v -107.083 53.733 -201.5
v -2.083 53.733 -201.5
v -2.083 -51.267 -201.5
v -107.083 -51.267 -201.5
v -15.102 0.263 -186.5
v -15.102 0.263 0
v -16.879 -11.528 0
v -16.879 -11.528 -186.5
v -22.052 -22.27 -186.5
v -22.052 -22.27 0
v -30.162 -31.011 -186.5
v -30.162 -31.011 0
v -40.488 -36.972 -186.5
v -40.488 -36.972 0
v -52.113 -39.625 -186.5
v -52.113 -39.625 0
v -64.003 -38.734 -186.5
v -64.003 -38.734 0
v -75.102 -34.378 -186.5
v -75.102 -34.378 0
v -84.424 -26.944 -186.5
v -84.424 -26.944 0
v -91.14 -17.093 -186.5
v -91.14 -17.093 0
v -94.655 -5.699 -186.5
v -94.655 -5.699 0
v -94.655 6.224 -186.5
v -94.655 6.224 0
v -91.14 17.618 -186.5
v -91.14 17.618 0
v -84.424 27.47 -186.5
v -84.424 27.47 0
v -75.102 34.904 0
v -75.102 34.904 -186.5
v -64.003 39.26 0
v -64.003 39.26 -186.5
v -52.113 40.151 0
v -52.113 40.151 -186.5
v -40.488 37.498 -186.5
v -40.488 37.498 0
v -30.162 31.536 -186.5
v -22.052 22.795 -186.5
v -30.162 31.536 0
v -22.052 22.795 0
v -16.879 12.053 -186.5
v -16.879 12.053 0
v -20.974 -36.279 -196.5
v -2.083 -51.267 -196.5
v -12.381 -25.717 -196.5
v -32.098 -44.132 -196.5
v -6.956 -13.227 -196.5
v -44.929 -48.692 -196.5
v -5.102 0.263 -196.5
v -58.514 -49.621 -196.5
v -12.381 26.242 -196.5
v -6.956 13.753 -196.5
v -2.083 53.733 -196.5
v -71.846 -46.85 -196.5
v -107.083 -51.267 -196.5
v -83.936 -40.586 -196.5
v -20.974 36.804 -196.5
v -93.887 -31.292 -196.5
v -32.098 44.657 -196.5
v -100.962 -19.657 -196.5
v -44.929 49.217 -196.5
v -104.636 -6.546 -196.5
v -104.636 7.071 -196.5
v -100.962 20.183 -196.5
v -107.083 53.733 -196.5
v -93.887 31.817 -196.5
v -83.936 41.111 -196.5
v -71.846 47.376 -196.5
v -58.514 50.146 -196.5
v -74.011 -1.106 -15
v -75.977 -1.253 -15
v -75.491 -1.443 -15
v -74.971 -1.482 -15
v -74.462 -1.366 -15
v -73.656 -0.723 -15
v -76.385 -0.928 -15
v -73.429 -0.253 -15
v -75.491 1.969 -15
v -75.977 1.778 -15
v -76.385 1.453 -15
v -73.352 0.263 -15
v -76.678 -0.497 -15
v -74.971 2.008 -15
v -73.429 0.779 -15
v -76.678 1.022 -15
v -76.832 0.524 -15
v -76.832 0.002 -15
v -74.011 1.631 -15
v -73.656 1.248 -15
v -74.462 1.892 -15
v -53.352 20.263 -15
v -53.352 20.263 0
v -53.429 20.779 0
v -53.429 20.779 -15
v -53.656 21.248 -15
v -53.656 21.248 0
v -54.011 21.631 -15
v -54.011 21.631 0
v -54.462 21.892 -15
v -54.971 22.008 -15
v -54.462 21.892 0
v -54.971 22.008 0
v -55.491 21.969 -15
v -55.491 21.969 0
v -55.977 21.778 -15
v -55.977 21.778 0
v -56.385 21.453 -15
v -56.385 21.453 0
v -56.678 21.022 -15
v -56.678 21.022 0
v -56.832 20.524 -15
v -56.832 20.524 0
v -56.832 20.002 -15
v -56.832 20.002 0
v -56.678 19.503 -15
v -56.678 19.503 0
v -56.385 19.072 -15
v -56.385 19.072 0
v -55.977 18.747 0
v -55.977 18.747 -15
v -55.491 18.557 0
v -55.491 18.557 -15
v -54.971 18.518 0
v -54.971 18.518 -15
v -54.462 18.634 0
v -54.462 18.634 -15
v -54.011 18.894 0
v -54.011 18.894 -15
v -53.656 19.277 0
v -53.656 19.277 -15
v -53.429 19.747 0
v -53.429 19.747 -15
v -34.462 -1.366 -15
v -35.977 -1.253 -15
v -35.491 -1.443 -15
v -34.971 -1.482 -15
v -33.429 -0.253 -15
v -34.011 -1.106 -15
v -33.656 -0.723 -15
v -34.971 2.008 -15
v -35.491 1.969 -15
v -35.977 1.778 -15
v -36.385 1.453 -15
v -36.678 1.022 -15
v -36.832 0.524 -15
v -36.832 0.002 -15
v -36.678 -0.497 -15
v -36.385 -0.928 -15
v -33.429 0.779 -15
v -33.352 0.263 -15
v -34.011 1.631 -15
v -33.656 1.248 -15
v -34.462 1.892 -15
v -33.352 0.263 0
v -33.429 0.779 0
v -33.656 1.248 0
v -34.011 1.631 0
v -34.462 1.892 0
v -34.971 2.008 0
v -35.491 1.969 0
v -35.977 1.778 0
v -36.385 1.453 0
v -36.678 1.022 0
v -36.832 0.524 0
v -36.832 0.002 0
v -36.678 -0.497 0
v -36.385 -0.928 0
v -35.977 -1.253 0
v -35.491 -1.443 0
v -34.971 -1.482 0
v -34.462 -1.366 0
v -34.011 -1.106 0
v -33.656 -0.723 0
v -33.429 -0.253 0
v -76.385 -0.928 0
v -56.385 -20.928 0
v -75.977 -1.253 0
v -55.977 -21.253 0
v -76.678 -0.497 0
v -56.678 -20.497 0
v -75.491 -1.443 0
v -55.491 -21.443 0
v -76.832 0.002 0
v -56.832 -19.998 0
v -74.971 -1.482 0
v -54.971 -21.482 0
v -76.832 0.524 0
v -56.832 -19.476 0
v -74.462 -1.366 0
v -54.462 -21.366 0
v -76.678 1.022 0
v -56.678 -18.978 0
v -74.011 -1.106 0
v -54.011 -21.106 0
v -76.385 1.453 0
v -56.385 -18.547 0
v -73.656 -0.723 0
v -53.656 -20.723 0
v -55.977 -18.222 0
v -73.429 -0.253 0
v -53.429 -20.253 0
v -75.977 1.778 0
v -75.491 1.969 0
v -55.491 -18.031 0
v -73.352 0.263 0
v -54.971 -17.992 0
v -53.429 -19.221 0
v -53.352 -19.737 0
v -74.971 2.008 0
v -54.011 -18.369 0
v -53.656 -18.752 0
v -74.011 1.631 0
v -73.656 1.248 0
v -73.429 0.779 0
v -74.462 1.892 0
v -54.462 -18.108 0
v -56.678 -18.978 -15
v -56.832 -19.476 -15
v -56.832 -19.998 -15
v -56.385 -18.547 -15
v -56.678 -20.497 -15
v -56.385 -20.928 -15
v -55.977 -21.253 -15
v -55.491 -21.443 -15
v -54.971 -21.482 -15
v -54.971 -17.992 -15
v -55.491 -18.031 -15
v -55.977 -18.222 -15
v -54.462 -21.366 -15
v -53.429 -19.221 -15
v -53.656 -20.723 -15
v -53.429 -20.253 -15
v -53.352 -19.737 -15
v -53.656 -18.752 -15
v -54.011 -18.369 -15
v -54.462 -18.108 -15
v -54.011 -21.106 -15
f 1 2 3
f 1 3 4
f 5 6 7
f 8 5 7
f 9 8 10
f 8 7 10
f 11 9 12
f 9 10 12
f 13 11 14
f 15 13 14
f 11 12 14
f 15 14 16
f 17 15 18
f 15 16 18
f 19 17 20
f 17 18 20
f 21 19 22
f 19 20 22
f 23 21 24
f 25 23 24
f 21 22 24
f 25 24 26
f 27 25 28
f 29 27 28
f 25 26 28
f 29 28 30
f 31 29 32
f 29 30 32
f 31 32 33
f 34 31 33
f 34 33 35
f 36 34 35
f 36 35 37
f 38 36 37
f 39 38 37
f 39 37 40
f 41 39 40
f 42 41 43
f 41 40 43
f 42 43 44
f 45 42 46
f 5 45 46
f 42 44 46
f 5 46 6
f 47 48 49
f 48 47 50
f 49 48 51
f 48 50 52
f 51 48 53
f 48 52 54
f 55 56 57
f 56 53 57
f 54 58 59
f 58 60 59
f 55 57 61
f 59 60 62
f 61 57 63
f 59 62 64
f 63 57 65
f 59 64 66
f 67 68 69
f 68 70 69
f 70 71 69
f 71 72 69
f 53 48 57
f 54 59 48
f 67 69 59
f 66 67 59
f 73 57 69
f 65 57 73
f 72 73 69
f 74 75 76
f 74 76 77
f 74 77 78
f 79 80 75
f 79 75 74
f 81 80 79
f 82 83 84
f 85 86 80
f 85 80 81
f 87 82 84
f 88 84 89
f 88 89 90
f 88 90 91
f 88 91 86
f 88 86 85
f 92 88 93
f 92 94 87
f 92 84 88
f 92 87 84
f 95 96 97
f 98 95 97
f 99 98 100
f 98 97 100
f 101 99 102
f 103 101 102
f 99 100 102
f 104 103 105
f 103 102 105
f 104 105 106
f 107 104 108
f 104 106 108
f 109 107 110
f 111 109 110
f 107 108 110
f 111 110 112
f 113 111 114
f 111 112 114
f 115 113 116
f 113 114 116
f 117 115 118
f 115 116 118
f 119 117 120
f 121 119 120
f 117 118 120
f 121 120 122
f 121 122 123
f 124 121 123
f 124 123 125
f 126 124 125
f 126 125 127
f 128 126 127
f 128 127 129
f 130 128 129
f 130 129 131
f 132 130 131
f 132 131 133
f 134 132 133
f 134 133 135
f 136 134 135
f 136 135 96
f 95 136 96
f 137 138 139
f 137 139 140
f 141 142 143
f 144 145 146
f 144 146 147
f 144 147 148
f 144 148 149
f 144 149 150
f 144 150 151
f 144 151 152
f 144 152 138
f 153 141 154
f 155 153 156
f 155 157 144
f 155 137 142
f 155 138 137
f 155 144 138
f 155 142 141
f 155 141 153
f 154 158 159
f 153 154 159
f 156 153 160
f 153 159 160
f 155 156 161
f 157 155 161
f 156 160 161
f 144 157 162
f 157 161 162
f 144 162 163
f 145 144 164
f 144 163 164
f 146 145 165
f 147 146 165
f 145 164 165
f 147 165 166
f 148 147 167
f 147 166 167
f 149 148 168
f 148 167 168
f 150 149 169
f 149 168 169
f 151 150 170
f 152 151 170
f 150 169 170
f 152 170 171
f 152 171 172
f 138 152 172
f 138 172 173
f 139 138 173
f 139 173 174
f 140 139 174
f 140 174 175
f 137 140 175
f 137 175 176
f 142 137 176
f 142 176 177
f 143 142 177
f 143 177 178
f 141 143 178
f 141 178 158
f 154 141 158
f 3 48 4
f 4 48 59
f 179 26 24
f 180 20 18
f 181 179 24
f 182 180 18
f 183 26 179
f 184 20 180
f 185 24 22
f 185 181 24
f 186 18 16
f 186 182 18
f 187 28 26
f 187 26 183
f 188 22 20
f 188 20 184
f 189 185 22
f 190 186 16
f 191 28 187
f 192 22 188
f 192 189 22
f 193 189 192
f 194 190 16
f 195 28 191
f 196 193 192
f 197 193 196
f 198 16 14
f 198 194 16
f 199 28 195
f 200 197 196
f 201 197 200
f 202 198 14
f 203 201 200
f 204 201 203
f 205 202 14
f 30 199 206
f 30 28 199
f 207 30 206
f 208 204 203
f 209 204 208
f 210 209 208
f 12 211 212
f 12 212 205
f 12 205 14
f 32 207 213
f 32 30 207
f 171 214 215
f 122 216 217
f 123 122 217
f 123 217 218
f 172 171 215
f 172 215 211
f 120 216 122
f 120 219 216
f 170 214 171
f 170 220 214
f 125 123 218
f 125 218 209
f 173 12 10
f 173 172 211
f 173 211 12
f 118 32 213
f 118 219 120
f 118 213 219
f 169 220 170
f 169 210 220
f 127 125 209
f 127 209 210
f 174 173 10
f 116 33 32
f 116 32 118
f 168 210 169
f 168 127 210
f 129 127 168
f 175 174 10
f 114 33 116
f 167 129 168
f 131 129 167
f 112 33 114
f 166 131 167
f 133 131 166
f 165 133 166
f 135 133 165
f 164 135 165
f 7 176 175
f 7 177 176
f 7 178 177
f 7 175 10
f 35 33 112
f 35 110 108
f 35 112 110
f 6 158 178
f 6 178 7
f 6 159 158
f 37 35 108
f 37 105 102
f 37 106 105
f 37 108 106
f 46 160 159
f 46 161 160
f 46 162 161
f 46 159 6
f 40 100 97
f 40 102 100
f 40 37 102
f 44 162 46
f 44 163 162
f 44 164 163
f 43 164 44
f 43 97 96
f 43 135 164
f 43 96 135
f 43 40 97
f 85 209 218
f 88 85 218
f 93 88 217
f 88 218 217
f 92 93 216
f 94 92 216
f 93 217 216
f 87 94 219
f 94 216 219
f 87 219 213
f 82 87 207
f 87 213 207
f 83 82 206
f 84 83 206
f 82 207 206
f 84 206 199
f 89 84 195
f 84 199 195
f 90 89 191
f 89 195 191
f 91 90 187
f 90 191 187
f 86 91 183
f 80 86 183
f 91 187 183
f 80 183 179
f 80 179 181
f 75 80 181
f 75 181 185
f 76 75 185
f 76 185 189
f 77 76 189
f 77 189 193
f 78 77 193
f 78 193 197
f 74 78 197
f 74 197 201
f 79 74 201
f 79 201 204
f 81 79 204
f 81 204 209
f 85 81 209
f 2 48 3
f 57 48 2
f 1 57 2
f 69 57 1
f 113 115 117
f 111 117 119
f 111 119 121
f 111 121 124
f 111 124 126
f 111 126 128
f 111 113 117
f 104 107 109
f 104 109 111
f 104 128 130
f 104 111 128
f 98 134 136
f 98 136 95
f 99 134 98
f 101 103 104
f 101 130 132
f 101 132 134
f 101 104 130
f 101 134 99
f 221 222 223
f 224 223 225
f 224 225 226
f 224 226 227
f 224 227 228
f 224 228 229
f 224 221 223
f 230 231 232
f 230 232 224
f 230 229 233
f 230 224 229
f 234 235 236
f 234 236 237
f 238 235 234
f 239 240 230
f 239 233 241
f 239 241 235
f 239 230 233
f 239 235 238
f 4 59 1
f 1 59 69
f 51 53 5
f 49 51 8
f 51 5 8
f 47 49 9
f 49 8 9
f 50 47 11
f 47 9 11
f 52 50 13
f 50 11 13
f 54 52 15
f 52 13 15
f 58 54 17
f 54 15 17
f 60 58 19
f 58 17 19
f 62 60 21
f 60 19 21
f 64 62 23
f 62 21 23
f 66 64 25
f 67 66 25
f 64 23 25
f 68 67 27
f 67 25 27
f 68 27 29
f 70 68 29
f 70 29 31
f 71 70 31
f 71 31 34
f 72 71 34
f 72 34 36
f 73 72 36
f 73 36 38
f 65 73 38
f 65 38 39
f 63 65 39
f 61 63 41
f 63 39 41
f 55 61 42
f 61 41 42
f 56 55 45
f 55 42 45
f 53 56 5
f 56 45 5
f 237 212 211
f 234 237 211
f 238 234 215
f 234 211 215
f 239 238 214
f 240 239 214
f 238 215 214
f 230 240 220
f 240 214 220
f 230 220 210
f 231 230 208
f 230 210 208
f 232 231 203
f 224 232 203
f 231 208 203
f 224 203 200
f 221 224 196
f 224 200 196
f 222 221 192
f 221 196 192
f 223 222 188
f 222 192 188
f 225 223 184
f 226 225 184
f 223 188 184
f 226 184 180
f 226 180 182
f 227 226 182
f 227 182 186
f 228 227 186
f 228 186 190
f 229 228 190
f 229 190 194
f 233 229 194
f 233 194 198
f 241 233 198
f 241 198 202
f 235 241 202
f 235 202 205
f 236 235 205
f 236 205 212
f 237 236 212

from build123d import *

# Parameters (mm, degrees)
CROQUIS1_W                  = 248.76
CROQUIS1_H                  = 195
SALIENTE_EXTRUIR1_DEPTH     = 5
CROQUIS2_W                  = 48
CROQUIS2_H                  = 30
CROQUIS2_W_2                = 30
CORTAR_EXTRUIR1_DEPTH       = 2
CROQUIS3_R                  = 2.375
CORTAR_EXTRUIR2_DEPTH       = 10
CROQUIS4_R                  = 40
SALIENTE_EXTRUIR2_DEPTH     = 196.5
CROQUIS5_R                  = 12.5
CORTAR_EXTRUIR3_DEPTH       = 10
CROQUIS12_W                 = 12
CROQUIS12_H                 = 30
SALIENTE_EXTRUIR3_DEPTH     = 4
REDONDEO1_R                 = 10
REDONDEO2_R                 = 10
REDONDEO3_R                 = 10
CORTAR_EXTRUIR5_DEPTH       = 255.266033949
CORTAR_EXTRUIR5_DEPTH_BACK  = 255.266033949
CROQUIS13_R                 = 1.625
CORTAR_EXTRUIR7_DEPTH       = 2
CROQUIS16_R                 = 1.75
CORTAR_EXTRUIR9_DEPTH       = 20
CORTAR_EXTRUIR17_DEPTH      = 307.465597013
CORTAR_EXTRUIR17_DEPTH_BACK = 307.465597013
CROQUIS21_W                 = 105
CROQUIS21_H                 = 105
SALIENTE_EXTRUIR4_DEPTH     = 5
CHAFL_N1_SIZE               = 10


with BuildPart() as part:
    # Croquis1 → Saliente-Extruir1 (new body)
    with BuildSketch(Plane.XY):
        with Locations((7.088293187, 0.26268)):
            Rectangle(CROQUIS1_W, CROQUIS1_H)
    extrude(amount=SALIENTE_EXTRUIR1_DEPTH)

    # Croquis2 → Cortar-Extruir1 (cut)
    with BuildSketch(Plane.XY.offset(5)):
        with Locations((-93.291706813, -82.23732)):
            Rectangle(CROQUIS2_W, CROQUIS2_H)
        with Locations((116.468293187, 82.76268)):
            Rectangle(CROQUIS2_W_2, CROQUIS2_H)
        with Locations((116.468293187, -82.23732)):
            Rectangle(CROQUIS2_W_2, CROQUIS2_H)
        with Locations((-93.291706813, 82.76268)):
            Rectangle(CROQUIS2_W, CROQUIS2_H)
    extrude(amount=-CORTAR_EXTRUIR1_DEPTH, mode=Mode.SUBTRACT)

    # Croquis3 → Cortar-Extruir2 (cut)
    with BuildSketch(Plane.XY.offset(5)):
        with Locations((-93.291706813, 83.76268)):
            Circle(CROQUIS3_R)
        with Locations((-93.291706813, -83.23732)):
            Circle(CROQUIS3_R)
        with Locations((116.468293187, 83.76268)):
            Circle(CROQUIS3_R)
        with Locations((116.468293187, -83.23732)):
            Circle(CROQUIS3_R)
    extrude(amount=-CORTAR_EXTRUIR2_DEPTH, mode=Mode.SUBTRACT)

    # Croquis4 → Saliente-Extruir2 (add)
    with BuildSketch(Plane(origin=(0, 0, 0), x_dir=(-1, 0, 0), z_dir=(0, 0, -1))):
        with Locations(Location((55.101706813, 0.26268, 0), (0, 0, 180))):
            Circle(CROQUIS4_R)
    extrude(amount=SALIENTE_EXTRUIR2_DEPTH)

    # Croquis5 → Cortar-Extruir3 (cut)
    with BuildSketch(Plane(origin=(0, 0, 0), x_dir=(-1, 0, 0), z_dir=(0, 0, -1))):
        with Locations((-76.968293187, 0.26268)):
            Circle(CROQUIS5_R)
    extrude(amount=-CORTAR_EXTRUIR3_DEPTH, mode=Mode.SUBTRACT)

    # Croquis12 → Saliente-Extruir3 (add, symmetric)
    with BuildSketch(Plane(origin=(7.088293187, 0, 0), x_dir=(0, 0, -1), z_dir=(1, 0, 0))):
        with Locations((6, 82.76268)):
            Rectangle(CROQUIS12_W, CROQUIS12_H)
        with Locations((6, -82.23732)):
            Rectangle(CROQUIS12_W, CROQUIS12_H)
    extrude(amount=SALIENTE_EXTRUIR3_DEPTH, both=True)

    # Redondeo1
    redondeo1_edges = [part.edges().sort_by_distance(p)[0] for p in [
        (7.088293187, 67.76268, 0),
        (7.088293187, -67.23732, 0),
    ]]
    fillet(redondeo1_edges, radius=REDONDEO1_R)

    # Redondeo2
    redondeo2_edges = [part.edges().sort_by_distance(p)[0] for p in [
        (7.088293187, 67.76268, -12),
        (7.088293187, -67.23732, -12),
    ]]
    fillet(redondeo2_edges, radius=REDONDEO2_R)

    # Redondeo3
    redondeo3_edges = [part.edges().sort_by_distance(p)[0] for p in [
        (7.088293187, 97.76268, -12),
        (7.088293187, -97.23732, -12),
    ]]
    fillet(redondeo3_edges, radius=REDONDEO3_R)

    # Croquis13 → Cortar-Extruir5 (cut, two sides: drawn at the far end of the back side and taken through both)
    with BuildSketch(Plane(origin=(11.088293187, 0, 0), x_dir=(0, 0, -1), z_dir=(1, 0, 0)).offset(-CORTAR_EXTRUIR5_DEPTH_BACK)):
        with Locations(Location((6, 87.76268, 0), (0, 0, 90))):
            Circle(CROQUIS13_R)
        with Locations(Location((6, 77.76268, 0), (0, 0, 90))):
            Circle(CROQUIS13_R)
        with Locations(Location((6, -77.23732, 0), (0, 0, 90))):
            Circle(CROQUIS13_R)
        with Locations(Location((6, -87.23732, 0), (0, 0, 90))):
            Circle(CROQUIS13_R)
    extrude(amount=CORTAR_EXTRUIR5_DEPTH + CORTAR_EXTRUIR5_DEPTH_BACK, mode=Mode.SUBTRACT)

    # Croquis15 → Cortar-Extruir7 (cut)
    with BuildSketch(Plane.XY.offset(5)):
        Polygon((111.468293187, 67.76268), (131.468293187, 67.76268), (131.468293187, -67.23732), (111.468293187, -67.23732), (111.468293187, -59.48732), (125.218293187, -59.48732), (125.218293187, 60.01268), (111.468293187, 60.01268), align=None)
    extrude(amount=-CORTAR_EXTRUIR7_DEPTH, mode=Mode.SUBTRACT)

    # Croquis16 → Cortar-Extruir9 (cut)
    with BuildSketch(Plane.XY.offset(5)):
        with Locations((-55.101706813, 20.26268)):
            Circle(CROQUIS16_R)
        with Locations((-35.101706813, 0.26268)):
            Circle(CROQUIS16_R)
        with Locations((-55.101706813, -19.73732)):
            Circle(CROQUIS16_R)
        with Locations((-75.101706813, 0.26268)):
            Circle(CROQUIS16_R)
    extrude(amount=-CORTAR_EXTRUIR9_DEPTH, mode=Mode.SUBTRACT)

    # Croquis20 → Cortar-Extruir17 (cut, two sides: drawn at the far end of the back side and taken through both)
    with BuildSketch(Plane.XZ.offset(97.23732).offset(-CORTAR_EXTRUIR17_DEPTH_BACK)):
        Polygon((-117.291706813, 10.531534682), (-117.291706813, 0), (3.088293187, 0), (3.088293187, -12), (11.088293187, -12), (11.088293187, 0), (131.468293187, 0), (131.468293187, 10.531534682), align=None)
    extrude(amount=CORTAR_EXTRUIR17_DEPTH + CORTAR_EXTRUIR17_DEPTH_BACK, mode=Mode.SUBTRACT)

    # Croquis21 → Saliente-Extruir4 (add)
    with BuildSketch(Plane(origin=(0, 0, -196.5), x_dir=(-1, 0, 0), z_dir=(0, 0, -1))):
        with Locations((54.583486428, 1.233156347)):
            Rectangle(CROQUIS21_W, CROQUIS21_H)
    extrude(amount=SALIENTE_EXTRUIR4_DEPTH)

    # Chaflán1
    chafl_n1_edges = [part.edges().sort_by_distance(p)[0] for p in [
        (-95.101706813, 0.26268, -196.5),
    ]]
    chamfer(chafl_n1_edges, length=CHAFL_N1_SIZE)


solid = part.part
